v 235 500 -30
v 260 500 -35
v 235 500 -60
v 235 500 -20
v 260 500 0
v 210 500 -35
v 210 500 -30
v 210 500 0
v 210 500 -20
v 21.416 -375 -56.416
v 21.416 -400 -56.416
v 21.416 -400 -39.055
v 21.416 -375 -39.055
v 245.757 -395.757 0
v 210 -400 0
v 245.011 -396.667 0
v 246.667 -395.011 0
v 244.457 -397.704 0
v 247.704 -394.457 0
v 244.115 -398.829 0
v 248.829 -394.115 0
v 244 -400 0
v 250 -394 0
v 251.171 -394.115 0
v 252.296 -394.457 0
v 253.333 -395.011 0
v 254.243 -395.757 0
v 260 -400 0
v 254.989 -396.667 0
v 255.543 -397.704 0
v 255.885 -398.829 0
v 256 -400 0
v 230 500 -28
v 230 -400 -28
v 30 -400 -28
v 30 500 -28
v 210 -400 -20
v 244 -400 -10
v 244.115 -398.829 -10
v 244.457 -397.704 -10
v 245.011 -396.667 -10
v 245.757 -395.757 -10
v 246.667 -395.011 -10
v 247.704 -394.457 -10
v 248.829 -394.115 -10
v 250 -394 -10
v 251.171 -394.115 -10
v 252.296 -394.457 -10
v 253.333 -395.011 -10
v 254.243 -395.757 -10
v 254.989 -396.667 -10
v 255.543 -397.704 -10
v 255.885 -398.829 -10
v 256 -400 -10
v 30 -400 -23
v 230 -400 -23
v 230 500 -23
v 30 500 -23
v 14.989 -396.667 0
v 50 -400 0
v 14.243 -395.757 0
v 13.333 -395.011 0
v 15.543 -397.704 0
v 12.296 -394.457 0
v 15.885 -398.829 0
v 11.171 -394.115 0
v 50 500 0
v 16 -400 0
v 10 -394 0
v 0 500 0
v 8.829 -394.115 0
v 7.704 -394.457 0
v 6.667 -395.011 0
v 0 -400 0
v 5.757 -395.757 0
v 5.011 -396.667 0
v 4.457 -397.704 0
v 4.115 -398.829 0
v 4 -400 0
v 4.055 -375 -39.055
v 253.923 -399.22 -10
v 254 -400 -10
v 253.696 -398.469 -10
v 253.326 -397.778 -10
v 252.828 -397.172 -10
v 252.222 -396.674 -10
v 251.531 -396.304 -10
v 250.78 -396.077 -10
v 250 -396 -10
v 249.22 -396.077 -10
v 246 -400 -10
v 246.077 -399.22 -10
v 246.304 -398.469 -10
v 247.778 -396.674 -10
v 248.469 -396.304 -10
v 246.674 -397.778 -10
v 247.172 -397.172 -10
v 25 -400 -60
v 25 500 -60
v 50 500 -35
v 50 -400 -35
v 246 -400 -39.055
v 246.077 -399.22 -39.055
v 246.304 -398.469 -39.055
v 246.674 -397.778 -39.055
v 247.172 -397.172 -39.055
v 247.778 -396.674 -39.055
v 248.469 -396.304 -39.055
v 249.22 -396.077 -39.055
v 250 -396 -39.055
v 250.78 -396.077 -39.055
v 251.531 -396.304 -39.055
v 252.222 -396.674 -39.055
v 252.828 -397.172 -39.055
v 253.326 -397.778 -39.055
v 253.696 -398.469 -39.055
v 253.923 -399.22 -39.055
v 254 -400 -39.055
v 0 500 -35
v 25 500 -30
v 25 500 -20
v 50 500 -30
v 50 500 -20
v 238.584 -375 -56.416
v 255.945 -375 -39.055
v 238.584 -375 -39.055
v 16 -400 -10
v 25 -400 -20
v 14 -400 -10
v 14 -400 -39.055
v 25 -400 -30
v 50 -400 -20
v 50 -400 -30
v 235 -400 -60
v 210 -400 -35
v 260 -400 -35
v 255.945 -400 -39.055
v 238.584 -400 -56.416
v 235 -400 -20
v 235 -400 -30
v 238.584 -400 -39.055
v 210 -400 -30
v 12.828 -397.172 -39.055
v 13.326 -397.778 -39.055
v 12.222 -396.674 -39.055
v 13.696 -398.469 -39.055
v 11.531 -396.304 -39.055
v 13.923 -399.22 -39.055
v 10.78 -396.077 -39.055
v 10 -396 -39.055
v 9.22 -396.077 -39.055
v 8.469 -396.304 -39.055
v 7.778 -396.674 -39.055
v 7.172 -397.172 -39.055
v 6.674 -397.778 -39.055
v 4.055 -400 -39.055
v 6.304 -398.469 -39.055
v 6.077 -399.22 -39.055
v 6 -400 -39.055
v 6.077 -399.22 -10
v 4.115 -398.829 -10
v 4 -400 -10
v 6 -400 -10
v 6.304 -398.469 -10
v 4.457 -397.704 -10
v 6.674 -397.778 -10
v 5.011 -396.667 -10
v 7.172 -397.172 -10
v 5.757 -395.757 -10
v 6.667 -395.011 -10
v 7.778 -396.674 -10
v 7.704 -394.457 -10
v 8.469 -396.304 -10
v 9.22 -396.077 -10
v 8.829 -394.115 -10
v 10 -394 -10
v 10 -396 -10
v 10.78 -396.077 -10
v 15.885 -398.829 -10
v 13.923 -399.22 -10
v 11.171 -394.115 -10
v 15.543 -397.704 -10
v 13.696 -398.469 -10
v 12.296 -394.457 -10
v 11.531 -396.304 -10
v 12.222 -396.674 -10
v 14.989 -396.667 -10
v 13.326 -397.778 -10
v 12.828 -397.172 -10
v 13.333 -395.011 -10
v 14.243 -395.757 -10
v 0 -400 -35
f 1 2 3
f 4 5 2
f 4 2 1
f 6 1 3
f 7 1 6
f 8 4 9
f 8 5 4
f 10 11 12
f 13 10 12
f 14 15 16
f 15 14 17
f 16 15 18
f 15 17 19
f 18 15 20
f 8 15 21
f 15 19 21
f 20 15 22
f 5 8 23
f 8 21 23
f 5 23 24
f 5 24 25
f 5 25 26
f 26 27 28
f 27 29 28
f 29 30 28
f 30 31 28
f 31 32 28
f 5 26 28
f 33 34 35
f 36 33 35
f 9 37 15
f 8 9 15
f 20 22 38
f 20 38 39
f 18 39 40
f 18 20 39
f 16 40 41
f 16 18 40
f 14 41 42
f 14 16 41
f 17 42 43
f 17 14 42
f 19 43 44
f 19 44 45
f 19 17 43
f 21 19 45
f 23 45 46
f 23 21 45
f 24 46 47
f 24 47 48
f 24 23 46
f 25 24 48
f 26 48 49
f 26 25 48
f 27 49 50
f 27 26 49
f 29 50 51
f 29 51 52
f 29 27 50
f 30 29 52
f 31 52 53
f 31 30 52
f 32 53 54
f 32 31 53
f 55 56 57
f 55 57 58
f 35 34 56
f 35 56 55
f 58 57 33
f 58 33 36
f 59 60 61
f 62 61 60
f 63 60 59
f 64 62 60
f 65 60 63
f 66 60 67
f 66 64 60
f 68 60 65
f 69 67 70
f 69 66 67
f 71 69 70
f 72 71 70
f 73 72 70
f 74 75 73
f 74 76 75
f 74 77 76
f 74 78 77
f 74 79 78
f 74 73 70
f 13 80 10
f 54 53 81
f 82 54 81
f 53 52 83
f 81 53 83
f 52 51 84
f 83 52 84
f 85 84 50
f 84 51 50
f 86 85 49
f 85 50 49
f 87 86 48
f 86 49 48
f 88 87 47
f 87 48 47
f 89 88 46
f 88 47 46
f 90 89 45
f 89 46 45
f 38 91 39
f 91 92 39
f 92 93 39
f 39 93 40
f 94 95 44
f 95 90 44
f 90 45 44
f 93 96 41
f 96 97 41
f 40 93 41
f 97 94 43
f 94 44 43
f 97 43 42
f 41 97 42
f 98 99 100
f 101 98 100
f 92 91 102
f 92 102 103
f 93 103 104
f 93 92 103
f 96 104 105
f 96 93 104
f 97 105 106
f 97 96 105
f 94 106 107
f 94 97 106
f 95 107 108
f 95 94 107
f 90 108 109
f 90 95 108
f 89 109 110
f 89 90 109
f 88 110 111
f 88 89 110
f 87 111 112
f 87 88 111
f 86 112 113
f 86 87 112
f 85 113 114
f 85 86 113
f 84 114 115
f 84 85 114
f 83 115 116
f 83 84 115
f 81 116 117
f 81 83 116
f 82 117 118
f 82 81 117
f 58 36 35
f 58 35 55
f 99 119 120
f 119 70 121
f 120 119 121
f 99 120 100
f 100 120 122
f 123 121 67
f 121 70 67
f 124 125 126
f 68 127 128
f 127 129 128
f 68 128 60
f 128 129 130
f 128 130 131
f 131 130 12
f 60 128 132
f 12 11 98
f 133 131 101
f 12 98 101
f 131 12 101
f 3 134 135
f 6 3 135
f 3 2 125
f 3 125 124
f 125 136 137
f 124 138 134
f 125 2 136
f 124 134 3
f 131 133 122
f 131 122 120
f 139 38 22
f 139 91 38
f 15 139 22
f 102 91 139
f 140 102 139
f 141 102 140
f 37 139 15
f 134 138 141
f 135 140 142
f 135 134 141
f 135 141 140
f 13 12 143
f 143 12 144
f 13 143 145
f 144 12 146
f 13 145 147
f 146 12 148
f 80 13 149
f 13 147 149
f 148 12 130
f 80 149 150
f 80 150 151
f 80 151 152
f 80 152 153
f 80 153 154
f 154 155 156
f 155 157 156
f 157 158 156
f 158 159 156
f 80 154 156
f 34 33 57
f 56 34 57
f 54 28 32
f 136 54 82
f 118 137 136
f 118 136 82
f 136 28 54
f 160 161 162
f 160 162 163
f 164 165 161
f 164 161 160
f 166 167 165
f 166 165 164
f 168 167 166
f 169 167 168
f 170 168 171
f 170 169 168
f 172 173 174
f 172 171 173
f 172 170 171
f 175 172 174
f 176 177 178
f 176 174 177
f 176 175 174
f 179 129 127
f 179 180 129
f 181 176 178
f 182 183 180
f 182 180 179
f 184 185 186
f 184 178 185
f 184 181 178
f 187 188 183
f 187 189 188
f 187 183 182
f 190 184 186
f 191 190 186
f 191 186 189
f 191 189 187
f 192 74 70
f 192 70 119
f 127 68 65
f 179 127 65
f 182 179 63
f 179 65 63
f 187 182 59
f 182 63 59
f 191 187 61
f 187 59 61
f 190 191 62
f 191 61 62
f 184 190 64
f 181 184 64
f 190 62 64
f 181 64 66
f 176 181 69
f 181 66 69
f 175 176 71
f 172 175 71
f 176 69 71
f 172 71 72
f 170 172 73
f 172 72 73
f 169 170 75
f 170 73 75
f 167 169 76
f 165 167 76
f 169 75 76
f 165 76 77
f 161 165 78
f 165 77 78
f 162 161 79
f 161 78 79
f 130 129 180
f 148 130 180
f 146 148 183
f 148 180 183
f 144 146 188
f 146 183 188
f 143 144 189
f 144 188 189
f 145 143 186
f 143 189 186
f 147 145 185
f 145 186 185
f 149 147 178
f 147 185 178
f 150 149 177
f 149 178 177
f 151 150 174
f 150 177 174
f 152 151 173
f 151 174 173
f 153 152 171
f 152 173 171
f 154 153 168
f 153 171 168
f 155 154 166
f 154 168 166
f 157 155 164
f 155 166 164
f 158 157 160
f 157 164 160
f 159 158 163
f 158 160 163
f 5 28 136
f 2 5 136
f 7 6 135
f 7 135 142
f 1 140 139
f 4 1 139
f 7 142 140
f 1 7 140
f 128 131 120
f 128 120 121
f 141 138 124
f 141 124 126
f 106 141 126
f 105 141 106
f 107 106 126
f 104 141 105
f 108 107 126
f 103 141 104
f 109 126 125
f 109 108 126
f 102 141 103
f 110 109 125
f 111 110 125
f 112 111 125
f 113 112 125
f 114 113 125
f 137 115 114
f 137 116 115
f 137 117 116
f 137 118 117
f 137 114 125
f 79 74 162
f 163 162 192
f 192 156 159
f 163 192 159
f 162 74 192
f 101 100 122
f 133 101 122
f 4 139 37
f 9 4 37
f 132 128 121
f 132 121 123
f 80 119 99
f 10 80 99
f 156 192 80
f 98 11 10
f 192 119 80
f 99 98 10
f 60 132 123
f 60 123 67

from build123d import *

# Parameters (mm, degrees)
F1_DEPTH      = 500
F2_W          = 100
F2_H          = 5
F3_DEPTH      = 500
F4_R          = 4
F6_DEPTH      = 60.001
F5_R          = 6
F7_DEPTH      = 10
F8_W          = 378.7088692188
F8_H          = 131.297647953
F9_DEPTH      = 60.001
F9_DEPTH_BACK = 1053
F11_DEPTH     = 25


# Not quite as in the source:
# - an extrude ends at something that could not be found from the text; its depth is read off the source's solid


with BuildPart() as f1:
    # F0 (on Front) → F1 (new body, symmetric)
    with BuildSketch(Plane.XZ):
        Polygon((50, 0), (0, 0), (0, -35), (25, -60), (50, -35), (50, -30), (25, -30), (25, -20), (50, -20), align=None)
    extrude(amount=F1_DEPTH, both=True)

    # F4 (on Top) → F6 (cut, through all)
    with BuildSketch(Plane.XY):
        with Locations((10, -400)):
            Circle(F4_R)
    extrude(amount=-F6_DEPTH, mode=Mode.SUBTRACT)

    # F5 (on Top) → F7 (cut)
    with BuildSketch(Plane.XY):
        with Locations((10, -400)):
            Circle(F5_R)
    extrude(amount=-F7_DEPTH, mode=Mode.SUBTRACT)


with BuildPart() as f3:
    # F2 (on Front) → F3 (new body, symmetric)
    with BuildSketch(Plane.XZ):
        with Locations((80, -25.5)):
            Rectangle(F2_W, F2_H)
    extrude(amount=F3_DEPTH, both=True)


with BuildPart() as f9_tool:
    # F8 (on Top) → F9 (new body, two sides)
    with BuildSketch(Plane.XY) as f9_sk:
        with Locations((61.5063756704, -465.6488239765)):
            Rectangle(F8_W, F8_H)
    extrude(amount=-F9_DEPTH)
    extrude(f9_sk.sketch, amount=F9_DEPTH_BACK)


with BuildPart() as f1_1:
    add(f1.part)

    # F9: cut by f9_tool
    add(f9_tool.part, mode=Mode.SUBTRACT)

    # F10 (on face) → F11 (cut)
    with BuildSketch(Plane.XZ.offset(400)):
        Polygon((14, -39.0548482537), (-6.0729645193, -39.0548482537), (-6.0729645193, -62.4141655862), (21.4163064957, -62.4141655862), (21.4163064957, -56.4163064957), (14, -49), align=None)
        Polygon((21.4163064957, -39.0548482537), (14, -39.0548482537), (14, -49), (21.4163064957, -56.4163064957), align=None)
    extrude(amount=-F11_DEPTH, mode=Mode.SUBTRACT)


with BuildPart() as f3_1:
    add(f3.part)

    # F9: cut by f9_tool
    add(f9_tool.part, mode=Mode.SUBTRACT)



with BuildPart() as f3_2:
    add(f3_1.part)
    # F12: F1, F3 across face
    add(f1_1.part.mirror(Plane(origin=(130, 50, -25.5), x_dir=(0, 1, 0), z_dir=(1, 0, 0))))
    add(f3_1.part.mirror(Plane(origin=(130, 50, -25.5), x_dir=(0, 1, 0), z_dir=(1, 0, 0))))


solid = Compound([f1_1.part, f3_2.part])
